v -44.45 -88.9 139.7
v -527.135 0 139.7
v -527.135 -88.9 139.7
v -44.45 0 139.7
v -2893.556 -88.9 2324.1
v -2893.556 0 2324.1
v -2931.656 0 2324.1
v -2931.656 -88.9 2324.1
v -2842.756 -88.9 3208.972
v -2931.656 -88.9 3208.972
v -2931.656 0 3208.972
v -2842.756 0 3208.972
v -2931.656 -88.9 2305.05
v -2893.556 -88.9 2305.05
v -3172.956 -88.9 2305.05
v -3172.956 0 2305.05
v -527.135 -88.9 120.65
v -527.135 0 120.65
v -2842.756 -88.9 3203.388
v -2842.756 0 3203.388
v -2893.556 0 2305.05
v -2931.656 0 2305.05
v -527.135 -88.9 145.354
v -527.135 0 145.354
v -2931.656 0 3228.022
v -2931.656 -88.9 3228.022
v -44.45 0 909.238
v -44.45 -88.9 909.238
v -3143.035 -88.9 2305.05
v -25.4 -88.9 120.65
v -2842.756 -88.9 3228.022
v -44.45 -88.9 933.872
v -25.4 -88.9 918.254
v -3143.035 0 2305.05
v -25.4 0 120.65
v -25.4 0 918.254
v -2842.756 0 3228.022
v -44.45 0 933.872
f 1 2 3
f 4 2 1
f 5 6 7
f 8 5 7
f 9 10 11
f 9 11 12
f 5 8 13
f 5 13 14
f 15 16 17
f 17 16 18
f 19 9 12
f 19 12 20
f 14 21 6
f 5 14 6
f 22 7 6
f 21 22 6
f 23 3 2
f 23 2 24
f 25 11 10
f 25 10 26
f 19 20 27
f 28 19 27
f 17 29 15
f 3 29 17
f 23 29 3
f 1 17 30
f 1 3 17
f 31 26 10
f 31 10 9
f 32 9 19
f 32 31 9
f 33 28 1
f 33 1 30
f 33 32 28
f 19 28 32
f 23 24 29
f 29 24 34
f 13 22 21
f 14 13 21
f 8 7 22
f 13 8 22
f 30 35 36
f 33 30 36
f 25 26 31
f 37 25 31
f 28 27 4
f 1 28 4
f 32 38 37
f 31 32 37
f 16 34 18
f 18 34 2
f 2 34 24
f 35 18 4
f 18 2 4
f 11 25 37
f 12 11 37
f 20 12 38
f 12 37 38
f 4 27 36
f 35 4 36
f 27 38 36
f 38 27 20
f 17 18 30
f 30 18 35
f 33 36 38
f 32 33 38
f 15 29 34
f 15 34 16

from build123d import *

# Parameters (mm, degrees)
F1_W     = 88.9
F1_H     = 19.05
F2_DEPTH = 88.9
F3_DEPTH = 88.9
F4_DEPTH = 88.9
F1_W_2   = 482.685464
F5_DEPTH = 88.9
F6_DEPTH = 88.9
F7_DEPTH = 88.9


with BuildPart() as f2:
    # F1 (on face) → F2 (new body)
    with BuildSketch(Plane.XZ):
        with Locations((-2887.206499, 3218.4967)):
            Rectangle(F1_W, F1_H)
    extrude(amount=F2_DEPTH)

    # F1 (on face) → F3 (join)
    with BuildSketch(Plane.XZ):
        Polygon((-44.45, 933.871715), (-2842.756499, 3228.0217), (-2842.756499, 3208.9717), (-2842.756499, 3203.387983), (-44.45, 909.237998), align=None)
    extrude(amount=F3_DEPTH)

    # F1 (on face) → F4 (join)
    with BuildSketch(Plane.XZ):
        Polygon((-25.4, 918.253856), (-44.45, 933.871715), (-44.45, 909.237998), (-44.45, 139.7), (-44.45, 120.65), (-25.4, 120.65), align=None)
    extrude(amount=F4_DEPTH)

    # F1 (on face) → F5 (join)
    with BuildSketch(Plane.XZ):
        with Locations((-285.792732, 130.175)):
            Rectangle(F1_W_2, F1_H)
    extrude(amount=F5_DEPTH)

    # F1 (on face) → F6 (join)
    with BuildSketch(Plane.XZ):
        Polygon((-3172.956499, 2305.05), (-527.135464, 120.65), (-527.135464, 139.7), (-527.135464, 145.353537), (-3143.034719, 2305.05), align=None)
    extrude(amount=F6_DEPTH)


with BuildPart() as f7:
    # F1 (on face) → F7 (new body)
    with BuildSketch(Plane.XZ):
        Polygon((-2893.556499, 2324.1), (-2931.656499, 2324.1), (-2931.656499, 2305.05), (-2912.606499, 2305.05), (-2893.556499, 2305.05), align=None)
    extrude(amount=F7_DEPTH)


solid = Compound([f2.part, f7.part])
